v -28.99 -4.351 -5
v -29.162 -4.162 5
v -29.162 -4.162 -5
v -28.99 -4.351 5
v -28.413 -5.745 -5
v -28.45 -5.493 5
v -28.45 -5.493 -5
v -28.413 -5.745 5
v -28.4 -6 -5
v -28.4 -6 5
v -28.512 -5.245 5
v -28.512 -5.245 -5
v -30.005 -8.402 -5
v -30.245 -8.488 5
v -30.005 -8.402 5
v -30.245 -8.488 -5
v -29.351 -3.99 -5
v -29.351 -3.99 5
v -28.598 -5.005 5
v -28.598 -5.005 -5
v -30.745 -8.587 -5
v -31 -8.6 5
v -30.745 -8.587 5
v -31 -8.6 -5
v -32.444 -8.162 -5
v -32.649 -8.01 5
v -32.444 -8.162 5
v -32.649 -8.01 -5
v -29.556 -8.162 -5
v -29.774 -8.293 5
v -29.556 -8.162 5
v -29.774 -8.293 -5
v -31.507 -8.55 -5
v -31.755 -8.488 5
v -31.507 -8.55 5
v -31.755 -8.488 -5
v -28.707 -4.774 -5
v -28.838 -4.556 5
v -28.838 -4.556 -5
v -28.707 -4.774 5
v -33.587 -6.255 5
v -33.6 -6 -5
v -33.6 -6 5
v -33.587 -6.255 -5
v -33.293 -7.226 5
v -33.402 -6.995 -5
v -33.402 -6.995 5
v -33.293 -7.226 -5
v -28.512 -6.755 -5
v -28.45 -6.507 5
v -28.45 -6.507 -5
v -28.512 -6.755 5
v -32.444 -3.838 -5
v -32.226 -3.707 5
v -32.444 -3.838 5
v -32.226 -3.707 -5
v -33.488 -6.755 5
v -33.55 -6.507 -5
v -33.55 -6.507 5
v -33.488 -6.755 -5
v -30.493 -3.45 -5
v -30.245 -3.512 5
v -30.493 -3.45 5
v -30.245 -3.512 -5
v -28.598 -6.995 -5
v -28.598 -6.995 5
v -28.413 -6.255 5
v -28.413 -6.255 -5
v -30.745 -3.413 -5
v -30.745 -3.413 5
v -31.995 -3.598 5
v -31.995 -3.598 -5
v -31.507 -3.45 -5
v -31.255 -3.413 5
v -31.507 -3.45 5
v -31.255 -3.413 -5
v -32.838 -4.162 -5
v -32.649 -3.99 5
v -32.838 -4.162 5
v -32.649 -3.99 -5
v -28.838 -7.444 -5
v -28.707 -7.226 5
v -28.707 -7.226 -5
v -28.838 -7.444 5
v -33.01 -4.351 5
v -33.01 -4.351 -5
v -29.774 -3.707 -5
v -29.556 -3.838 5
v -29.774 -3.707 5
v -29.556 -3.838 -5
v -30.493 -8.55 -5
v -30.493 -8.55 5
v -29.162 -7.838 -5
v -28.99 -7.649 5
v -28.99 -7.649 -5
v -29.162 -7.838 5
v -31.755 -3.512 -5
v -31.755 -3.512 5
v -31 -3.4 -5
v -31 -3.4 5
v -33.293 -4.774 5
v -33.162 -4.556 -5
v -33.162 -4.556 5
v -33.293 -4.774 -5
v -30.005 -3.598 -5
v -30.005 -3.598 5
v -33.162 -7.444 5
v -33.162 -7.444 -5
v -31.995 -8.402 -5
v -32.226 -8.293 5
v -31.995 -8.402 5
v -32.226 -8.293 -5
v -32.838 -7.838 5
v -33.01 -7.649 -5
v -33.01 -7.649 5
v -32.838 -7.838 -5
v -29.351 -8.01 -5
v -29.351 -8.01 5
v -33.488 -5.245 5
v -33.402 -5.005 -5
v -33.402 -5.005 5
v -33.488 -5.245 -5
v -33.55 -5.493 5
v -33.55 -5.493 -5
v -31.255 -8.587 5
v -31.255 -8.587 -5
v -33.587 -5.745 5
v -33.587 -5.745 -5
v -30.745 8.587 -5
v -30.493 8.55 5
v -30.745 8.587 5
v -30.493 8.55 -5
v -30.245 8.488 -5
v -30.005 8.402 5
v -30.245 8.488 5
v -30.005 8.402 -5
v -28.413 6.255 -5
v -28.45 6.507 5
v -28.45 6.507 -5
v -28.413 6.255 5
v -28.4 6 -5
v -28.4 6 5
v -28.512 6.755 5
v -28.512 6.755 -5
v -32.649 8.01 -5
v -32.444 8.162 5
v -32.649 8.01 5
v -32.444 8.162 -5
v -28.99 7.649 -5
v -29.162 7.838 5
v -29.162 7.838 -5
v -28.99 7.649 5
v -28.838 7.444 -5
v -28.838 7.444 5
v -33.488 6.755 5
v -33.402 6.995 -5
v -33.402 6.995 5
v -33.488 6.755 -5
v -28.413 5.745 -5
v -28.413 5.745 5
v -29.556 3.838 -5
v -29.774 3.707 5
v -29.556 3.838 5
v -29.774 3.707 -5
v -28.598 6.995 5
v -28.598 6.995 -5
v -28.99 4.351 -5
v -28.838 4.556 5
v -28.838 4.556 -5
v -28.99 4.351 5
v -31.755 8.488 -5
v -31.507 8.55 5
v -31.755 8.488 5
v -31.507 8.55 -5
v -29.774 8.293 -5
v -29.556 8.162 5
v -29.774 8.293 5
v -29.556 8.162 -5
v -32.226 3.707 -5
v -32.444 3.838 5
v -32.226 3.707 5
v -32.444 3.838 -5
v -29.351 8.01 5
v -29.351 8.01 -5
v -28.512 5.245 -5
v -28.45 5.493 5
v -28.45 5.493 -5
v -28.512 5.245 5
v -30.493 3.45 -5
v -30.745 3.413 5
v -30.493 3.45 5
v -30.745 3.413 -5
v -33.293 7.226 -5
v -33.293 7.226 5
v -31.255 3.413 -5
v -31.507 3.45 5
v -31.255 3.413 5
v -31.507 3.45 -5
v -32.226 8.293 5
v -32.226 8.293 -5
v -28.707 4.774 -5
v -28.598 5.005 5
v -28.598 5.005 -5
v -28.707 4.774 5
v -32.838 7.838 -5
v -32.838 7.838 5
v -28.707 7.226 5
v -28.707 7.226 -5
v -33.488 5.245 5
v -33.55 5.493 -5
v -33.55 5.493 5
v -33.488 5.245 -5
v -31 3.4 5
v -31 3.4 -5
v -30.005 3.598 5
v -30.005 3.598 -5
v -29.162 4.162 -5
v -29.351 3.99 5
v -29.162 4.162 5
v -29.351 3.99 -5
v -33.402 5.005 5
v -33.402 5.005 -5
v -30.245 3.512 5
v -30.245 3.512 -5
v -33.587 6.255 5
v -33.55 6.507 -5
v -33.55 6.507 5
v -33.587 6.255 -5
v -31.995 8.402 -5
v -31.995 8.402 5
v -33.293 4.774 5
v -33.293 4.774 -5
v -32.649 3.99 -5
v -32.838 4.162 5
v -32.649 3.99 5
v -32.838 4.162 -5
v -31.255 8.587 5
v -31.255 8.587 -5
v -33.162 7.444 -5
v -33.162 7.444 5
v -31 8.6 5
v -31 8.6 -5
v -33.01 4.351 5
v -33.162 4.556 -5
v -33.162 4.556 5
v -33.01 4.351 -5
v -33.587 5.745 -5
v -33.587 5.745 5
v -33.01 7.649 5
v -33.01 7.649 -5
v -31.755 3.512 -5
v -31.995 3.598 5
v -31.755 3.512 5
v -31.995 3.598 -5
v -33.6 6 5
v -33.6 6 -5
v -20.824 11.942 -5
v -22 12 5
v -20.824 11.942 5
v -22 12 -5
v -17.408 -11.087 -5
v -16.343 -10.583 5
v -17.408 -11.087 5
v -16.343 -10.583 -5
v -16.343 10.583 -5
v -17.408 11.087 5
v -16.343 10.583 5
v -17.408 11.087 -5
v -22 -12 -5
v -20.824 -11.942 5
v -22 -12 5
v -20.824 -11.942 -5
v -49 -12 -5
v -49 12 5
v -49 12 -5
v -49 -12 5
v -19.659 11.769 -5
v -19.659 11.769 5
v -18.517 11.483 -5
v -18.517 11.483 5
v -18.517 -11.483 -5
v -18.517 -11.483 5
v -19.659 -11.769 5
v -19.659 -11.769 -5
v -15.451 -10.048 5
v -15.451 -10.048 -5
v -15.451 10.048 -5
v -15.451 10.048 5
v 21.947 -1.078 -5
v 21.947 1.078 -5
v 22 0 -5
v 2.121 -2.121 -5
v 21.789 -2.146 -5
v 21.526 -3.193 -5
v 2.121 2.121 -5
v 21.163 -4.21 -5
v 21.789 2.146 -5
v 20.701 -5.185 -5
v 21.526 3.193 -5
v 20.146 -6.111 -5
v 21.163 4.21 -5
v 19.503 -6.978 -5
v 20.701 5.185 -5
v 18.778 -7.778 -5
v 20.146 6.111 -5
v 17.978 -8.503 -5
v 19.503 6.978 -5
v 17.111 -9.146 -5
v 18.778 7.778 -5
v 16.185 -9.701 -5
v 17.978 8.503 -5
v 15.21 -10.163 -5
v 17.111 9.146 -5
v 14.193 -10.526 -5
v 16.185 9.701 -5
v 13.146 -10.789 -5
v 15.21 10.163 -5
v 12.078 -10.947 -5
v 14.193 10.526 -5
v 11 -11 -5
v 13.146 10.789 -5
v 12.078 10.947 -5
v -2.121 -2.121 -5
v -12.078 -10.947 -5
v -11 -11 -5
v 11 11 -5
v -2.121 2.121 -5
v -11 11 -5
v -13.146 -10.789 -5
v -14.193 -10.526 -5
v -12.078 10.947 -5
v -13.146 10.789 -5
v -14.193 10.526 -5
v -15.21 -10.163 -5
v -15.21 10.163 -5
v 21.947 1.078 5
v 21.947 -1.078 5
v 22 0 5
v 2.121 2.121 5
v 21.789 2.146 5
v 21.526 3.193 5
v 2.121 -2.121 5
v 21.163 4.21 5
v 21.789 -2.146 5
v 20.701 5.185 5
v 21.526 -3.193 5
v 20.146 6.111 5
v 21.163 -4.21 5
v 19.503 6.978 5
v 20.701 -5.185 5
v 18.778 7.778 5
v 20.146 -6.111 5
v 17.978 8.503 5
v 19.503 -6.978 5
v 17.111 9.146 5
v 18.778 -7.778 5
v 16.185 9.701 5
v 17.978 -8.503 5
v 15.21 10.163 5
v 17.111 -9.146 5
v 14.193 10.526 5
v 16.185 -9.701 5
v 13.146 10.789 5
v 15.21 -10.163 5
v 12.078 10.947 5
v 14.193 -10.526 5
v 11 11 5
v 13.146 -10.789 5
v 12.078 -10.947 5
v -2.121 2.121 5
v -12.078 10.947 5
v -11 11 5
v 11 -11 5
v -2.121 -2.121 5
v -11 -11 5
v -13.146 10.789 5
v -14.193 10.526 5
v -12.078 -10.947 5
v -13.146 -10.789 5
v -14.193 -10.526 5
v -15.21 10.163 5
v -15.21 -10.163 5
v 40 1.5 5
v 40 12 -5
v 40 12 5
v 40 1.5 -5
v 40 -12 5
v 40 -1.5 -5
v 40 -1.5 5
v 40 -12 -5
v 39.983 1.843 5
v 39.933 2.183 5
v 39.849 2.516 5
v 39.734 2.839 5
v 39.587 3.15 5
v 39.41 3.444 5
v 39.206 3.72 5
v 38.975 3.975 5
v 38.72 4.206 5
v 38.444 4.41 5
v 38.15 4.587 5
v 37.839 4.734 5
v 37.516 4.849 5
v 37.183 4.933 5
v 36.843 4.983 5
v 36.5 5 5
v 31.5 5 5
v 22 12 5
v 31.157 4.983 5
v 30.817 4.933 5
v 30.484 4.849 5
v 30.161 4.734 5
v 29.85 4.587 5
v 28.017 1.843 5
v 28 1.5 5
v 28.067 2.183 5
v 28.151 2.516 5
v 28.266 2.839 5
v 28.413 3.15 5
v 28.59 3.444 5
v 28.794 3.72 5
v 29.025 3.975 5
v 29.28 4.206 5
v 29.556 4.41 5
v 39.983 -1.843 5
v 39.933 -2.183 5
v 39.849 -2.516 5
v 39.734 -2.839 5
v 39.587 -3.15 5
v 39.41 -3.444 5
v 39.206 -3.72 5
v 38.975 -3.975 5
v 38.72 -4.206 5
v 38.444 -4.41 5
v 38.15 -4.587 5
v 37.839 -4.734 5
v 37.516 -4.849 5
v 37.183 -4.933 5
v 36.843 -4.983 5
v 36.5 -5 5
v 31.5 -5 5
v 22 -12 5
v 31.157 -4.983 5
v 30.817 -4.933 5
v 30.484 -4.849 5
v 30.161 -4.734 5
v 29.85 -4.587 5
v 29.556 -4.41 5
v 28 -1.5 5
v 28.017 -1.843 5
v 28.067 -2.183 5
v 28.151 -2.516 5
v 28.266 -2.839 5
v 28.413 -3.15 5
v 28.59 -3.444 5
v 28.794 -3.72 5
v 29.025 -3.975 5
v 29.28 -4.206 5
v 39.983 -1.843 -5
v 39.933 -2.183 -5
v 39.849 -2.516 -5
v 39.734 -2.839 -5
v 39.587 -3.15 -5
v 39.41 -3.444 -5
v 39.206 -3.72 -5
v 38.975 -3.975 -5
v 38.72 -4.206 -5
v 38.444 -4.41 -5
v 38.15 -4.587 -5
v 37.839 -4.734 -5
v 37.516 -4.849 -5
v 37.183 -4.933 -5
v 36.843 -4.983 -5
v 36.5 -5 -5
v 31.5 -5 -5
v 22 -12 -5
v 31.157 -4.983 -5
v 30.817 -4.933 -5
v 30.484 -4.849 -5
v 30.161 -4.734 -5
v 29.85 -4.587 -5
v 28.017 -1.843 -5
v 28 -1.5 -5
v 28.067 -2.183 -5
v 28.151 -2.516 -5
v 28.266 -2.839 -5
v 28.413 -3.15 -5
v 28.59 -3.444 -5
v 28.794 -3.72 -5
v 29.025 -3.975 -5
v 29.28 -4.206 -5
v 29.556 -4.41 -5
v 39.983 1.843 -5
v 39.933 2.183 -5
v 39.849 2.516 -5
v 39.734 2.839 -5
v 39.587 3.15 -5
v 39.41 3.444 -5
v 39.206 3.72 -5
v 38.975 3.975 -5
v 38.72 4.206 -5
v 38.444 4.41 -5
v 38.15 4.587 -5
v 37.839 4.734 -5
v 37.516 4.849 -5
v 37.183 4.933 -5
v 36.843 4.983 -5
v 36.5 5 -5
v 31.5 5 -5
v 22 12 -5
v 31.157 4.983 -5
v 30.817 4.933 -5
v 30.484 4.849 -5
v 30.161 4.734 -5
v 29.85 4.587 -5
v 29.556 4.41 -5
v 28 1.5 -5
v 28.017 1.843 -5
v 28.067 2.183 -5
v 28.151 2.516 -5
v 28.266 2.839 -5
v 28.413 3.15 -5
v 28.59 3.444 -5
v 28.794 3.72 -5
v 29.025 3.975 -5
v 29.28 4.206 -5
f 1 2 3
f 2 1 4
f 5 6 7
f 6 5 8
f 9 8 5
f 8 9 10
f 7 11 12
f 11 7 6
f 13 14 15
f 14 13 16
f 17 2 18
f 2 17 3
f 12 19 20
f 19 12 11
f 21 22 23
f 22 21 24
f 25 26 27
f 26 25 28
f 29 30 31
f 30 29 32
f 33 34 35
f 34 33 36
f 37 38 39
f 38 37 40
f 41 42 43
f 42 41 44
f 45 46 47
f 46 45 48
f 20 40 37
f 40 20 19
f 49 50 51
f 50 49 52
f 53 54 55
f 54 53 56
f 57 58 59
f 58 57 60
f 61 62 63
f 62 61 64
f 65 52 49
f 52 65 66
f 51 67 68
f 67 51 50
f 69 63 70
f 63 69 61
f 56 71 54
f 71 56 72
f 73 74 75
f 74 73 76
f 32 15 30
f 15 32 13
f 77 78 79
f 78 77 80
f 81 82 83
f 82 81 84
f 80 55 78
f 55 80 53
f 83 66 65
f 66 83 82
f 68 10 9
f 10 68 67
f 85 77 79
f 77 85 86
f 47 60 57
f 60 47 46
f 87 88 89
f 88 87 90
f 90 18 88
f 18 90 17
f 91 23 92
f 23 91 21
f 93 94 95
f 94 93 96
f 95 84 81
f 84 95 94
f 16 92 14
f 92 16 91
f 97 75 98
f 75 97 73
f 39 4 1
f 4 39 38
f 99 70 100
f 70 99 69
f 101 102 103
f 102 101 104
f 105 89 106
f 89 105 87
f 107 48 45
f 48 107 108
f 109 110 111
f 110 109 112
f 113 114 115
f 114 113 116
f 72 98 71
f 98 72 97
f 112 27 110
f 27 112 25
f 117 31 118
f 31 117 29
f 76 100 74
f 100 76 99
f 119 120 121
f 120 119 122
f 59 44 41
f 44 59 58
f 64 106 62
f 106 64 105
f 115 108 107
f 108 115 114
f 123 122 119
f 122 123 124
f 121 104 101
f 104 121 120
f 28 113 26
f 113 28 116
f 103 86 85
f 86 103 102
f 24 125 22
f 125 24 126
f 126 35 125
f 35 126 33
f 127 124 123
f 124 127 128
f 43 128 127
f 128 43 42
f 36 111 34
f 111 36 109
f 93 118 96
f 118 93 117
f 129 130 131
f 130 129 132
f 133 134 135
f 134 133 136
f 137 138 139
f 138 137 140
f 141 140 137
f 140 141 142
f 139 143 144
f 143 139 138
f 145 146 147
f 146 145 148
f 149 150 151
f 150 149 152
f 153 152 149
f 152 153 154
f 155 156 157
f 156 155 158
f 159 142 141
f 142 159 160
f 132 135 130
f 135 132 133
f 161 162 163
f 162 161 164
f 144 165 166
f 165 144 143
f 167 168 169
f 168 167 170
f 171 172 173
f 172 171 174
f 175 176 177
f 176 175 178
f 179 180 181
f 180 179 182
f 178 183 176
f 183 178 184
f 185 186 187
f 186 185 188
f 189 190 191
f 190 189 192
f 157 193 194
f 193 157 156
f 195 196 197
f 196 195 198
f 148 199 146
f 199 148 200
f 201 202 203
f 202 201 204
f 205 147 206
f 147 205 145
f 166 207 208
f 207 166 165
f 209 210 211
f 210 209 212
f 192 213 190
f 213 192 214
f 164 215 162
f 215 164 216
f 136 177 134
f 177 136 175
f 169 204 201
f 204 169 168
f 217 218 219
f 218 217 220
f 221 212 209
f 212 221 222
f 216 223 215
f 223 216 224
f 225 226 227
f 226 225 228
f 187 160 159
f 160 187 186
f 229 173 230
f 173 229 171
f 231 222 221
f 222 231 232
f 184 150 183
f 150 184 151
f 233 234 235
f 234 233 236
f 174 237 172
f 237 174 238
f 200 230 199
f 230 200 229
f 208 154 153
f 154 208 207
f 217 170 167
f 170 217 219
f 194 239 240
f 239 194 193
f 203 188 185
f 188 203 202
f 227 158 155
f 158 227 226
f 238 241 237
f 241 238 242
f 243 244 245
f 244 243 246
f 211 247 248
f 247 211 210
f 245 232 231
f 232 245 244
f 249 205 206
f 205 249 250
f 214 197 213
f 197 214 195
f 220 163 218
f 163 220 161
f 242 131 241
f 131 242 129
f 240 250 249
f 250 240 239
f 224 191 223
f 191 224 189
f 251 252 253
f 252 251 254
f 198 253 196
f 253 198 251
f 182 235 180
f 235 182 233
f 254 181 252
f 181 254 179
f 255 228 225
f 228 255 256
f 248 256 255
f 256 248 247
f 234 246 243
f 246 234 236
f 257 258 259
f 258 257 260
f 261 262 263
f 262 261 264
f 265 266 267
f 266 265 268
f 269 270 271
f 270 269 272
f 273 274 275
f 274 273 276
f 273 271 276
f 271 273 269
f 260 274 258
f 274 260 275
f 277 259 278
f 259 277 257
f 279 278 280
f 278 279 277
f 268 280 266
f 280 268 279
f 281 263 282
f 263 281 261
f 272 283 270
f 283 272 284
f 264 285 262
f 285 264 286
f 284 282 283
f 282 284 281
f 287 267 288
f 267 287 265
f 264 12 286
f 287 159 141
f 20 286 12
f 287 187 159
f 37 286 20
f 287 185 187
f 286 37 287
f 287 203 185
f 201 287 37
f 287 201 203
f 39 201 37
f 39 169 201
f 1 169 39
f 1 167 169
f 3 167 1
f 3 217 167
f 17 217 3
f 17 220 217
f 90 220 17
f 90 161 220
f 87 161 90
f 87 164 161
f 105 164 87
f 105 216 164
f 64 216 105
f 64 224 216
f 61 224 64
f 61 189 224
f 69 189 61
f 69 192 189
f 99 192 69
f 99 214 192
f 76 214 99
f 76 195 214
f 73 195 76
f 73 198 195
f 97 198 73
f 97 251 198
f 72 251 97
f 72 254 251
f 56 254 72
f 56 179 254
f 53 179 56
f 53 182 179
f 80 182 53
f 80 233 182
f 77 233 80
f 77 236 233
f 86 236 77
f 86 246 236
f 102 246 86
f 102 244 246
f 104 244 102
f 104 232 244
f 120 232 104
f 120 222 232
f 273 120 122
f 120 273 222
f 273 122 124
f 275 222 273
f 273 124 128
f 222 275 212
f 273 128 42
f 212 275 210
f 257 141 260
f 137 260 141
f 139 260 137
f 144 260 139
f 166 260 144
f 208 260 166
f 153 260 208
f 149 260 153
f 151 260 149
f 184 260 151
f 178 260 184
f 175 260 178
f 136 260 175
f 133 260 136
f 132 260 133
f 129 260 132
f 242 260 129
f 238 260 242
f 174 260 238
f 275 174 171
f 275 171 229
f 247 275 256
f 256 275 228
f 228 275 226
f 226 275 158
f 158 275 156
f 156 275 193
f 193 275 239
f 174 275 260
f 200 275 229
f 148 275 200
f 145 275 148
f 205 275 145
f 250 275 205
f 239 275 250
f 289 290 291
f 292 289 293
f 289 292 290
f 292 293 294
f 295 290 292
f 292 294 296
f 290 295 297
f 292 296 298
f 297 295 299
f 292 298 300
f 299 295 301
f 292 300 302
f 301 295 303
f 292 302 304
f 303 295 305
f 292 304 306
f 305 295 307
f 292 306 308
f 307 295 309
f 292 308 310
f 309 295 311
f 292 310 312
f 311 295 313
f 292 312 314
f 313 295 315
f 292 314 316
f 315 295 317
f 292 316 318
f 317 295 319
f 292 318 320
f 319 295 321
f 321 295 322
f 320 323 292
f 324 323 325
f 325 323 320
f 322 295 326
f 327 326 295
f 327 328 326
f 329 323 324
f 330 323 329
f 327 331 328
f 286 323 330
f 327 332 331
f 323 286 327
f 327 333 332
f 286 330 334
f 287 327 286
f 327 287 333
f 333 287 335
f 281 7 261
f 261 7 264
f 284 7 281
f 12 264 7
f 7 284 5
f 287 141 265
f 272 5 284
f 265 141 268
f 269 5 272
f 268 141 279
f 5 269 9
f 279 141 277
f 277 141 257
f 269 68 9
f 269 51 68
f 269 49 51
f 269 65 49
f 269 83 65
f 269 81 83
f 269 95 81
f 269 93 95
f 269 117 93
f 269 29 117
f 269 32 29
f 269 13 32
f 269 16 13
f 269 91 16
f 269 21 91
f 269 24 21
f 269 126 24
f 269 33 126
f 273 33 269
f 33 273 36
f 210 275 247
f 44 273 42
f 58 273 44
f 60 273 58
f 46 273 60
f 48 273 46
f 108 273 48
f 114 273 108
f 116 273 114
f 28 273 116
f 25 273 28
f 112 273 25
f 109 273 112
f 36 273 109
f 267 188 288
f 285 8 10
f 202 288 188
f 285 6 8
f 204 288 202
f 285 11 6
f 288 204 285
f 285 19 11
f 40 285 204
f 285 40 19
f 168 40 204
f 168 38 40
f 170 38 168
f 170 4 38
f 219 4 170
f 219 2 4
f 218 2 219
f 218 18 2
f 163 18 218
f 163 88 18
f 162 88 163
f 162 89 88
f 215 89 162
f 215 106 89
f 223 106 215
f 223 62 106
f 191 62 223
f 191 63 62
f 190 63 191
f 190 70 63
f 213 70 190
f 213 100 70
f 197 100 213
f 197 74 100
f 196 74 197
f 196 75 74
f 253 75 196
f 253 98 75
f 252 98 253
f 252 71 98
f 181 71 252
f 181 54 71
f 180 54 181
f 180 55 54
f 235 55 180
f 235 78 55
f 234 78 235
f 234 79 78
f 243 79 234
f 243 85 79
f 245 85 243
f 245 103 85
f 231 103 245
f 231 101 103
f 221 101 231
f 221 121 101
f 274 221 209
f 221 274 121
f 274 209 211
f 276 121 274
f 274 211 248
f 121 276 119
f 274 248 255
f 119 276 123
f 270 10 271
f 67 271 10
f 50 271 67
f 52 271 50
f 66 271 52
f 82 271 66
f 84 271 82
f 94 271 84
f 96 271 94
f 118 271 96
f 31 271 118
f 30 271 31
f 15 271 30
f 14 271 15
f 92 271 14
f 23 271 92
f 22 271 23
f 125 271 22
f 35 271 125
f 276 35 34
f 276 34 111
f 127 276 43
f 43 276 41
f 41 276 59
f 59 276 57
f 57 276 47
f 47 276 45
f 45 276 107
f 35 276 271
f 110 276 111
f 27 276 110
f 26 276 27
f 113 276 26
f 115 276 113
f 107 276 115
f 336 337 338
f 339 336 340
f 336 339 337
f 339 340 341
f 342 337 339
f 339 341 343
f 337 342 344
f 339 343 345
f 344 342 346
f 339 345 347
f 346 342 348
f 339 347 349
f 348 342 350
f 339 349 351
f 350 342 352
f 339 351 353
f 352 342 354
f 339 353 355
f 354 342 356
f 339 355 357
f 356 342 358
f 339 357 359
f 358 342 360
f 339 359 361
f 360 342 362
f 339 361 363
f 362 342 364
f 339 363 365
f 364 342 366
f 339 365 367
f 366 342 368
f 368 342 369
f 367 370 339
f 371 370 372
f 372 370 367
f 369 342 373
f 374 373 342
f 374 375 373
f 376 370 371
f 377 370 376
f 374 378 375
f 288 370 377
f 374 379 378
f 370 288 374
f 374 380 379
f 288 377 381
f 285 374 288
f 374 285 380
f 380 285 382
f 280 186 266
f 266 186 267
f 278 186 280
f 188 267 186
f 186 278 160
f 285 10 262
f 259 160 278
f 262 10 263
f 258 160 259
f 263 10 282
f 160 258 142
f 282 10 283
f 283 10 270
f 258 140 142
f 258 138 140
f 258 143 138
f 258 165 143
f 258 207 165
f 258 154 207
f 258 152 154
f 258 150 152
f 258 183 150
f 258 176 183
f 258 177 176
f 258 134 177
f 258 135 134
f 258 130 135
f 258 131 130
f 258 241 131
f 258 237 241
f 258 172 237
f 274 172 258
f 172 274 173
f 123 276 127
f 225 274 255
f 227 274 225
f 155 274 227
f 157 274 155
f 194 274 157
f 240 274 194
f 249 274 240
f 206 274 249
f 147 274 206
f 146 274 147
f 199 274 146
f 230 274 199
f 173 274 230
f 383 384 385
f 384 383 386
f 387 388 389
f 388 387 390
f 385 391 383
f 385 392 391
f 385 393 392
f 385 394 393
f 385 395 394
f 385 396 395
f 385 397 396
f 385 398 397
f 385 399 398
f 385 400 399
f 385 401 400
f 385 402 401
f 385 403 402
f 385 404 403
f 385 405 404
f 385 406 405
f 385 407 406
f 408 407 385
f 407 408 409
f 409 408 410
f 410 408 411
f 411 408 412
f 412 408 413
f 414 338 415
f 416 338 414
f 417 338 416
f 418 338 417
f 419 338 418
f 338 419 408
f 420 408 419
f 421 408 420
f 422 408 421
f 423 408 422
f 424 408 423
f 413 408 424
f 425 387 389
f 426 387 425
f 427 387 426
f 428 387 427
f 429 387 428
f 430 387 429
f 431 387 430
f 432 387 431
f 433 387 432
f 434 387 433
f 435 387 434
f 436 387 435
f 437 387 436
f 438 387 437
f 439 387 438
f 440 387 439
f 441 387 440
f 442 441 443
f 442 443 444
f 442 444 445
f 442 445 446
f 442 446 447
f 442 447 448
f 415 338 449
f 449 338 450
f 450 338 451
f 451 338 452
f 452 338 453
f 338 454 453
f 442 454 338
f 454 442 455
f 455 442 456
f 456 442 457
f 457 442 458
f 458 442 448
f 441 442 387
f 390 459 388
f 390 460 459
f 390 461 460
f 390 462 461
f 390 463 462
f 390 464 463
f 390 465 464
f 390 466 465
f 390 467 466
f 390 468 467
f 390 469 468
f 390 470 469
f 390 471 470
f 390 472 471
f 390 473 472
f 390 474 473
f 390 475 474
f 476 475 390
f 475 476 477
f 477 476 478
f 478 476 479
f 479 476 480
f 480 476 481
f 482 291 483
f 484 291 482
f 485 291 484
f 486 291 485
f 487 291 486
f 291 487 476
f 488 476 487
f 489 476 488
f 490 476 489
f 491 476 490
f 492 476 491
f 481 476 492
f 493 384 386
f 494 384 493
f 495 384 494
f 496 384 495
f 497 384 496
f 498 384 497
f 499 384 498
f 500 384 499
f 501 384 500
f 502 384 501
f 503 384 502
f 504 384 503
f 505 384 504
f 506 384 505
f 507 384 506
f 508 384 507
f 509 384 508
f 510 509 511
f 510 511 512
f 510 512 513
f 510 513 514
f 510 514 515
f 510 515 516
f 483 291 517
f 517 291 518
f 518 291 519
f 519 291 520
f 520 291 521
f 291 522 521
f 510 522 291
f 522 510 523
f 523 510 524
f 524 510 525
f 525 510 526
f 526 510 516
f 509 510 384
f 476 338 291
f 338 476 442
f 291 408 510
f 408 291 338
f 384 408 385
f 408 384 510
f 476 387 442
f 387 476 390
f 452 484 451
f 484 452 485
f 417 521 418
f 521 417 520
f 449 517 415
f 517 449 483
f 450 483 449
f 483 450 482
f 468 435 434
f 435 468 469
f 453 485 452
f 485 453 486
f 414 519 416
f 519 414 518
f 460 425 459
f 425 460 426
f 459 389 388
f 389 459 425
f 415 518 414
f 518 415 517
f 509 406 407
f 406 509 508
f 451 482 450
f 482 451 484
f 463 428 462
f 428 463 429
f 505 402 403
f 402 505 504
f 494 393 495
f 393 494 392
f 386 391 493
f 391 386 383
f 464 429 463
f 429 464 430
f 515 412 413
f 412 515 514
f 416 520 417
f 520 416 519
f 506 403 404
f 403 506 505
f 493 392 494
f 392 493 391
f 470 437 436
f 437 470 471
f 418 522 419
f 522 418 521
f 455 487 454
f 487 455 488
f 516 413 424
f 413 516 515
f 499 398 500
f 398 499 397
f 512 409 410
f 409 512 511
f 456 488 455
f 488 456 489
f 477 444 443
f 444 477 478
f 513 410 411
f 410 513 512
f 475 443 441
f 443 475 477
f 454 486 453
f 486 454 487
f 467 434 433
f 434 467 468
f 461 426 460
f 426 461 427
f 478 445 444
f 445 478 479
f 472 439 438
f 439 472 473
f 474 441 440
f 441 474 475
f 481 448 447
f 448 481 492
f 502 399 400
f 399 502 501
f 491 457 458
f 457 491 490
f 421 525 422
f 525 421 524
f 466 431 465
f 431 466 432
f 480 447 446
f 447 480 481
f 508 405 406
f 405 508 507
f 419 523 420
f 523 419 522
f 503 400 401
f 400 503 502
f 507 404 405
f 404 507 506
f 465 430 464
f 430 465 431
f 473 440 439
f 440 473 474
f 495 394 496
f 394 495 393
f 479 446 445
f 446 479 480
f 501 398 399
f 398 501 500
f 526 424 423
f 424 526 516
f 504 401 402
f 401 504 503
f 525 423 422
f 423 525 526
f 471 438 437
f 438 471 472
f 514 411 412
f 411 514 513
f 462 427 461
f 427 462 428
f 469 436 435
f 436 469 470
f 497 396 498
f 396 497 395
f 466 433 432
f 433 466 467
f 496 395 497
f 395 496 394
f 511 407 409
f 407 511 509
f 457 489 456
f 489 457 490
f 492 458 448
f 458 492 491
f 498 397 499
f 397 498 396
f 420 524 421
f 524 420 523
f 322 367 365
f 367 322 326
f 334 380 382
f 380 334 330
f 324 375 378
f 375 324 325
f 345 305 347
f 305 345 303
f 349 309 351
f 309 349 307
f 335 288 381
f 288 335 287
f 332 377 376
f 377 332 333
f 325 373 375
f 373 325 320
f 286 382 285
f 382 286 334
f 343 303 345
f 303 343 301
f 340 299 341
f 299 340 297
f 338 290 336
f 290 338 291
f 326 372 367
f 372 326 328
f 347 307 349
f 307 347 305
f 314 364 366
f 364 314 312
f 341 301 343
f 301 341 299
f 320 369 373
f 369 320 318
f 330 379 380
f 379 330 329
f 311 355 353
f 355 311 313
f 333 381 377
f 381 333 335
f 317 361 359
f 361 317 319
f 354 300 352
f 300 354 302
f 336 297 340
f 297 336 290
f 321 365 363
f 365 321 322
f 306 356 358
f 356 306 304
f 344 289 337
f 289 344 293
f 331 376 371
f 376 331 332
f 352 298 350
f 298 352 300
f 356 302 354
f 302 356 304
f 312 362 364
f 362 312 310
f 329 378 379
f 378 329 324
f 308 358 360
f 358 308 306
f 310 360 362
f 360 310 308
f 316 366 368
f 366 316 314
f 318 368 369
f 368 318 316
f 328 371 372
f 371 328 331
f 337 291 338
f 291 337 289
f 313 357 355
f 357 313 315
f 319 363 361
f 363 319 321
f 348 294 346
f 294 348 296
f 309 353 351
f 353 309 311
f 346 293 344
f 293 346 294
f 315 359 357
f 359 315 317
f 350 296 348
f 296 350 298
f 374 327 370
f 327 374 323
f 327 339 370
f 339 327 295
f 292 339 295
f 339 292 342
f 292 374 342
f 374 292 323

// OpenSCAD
$fn=64;

L = 80;
W = 24;
T = 10;

bodyL = 44;
tabL = 18;
clevisL = 18;

bodyW = 22;
tabW = 24;
clevisW = 24;

endR = bodyW/2;

hole_d = 5.2;
hole_spacing = 12;

diamond_d = 6.0;

clevis_slotW = 10;
clevis_slotDepth = 12;
clevis_slotEndR = 3.5;

clevis_pin_d = 6.2;
clevis_pin_z = 0;

module rounded_rect_2d(w,h,r){
    r2 = min(r, min(w,h)/2);
    hull(){
        translate([ w/2-r2,  h/2-r2]) circle(r=r2);
        translate([-w/2+r2,  h/2-r2]) circle(r=r2);
        translate([ w/2-r2, -h/2+r2]) circle(r=r2);
        translate([-w/2+r2, -h/2+r2]) circle(r=r2);
    }
}

module barrel_body(len, w, t){
    hull(){
        translate([-len/2 + w/2, 0, 0]) cylinder(h=t, r=w/2, center=true);
        translate([ len/2 - w/2, 0, 0]) cylinder(h=t, r=w/2, center=true);
    }
}

module tab_with_two_holes(len, w, t, hole_d, spacing){
    difference(){
        hull(){
            translate([-len/2, 0, 0]) cube([len, w, t], center=true);
            translate([ len/2, 0, 0]) cylinder(h=t, r=w/2, center=true);
        }
        for (yy=[-spacing/2, spacing/2]){
            translate([0, yy, 0]) cylinder(h=t+2, d=hole_d, center=true);
        }
    }
}

module clevis_end(len, w, t, slotW, slotDepth, slotEndR, pin_d){
    difference(){
        translate([0,0,0]) cube([len, w, t], center=true);
        translate([len/2 - slotDepth/2, 0, 0])
            hull(){
                translate([-slotDepth/2 + slotEndR,  slotW/2 - slotEndR, 0]) cylinder(h=t+2, r=slotEndR, center=true);
                translate([-slotDepth/2 + slotEndR, -slotW/2 + slotEndR, 0]) cylinder(h=t+2, r=slotEndR, center=true);
                translate([ slotDepth/2 - slotEndR,  slotW/2 - slotEndR, 0]) cylinder(h=t+2, r=slotEndR, center=true);
                translate([ slotDepth/2 - slotEndR, -slotW/2 + slotEndR, 0]) cylinder(h=t+2, r=slotEndR, center=true);
            }
        translate([len/2 - slotDepth + 6, 0, 0]) cylinder(h=t+2, d=pin_d, center=true);
    }
}

module diamond_hole(t, d){
    rotate([0,0,45]) cylinder(h=t+2, r=d/2, center=true, $fn=4);
}

module bracket(){
    difference(){
        union(){
            barrel_body(bodyL, bodyW, T);
            translate([-(bodyL/2 + tabL/2), 0, 0]) tab_with_two_holes(tabL, tabW, T, hole_d, hole_spacing);
            translate([(bodyL/2 + clevisL/2), 0, 0]) clevis_end(clevisL, clevisW, T, clevis_slotW, clevis_slotDepth, clevis_slotEndR, clevis_pin_d);
        }
        diamond_hole(T, diamond_d);
    }
}

bracket();
